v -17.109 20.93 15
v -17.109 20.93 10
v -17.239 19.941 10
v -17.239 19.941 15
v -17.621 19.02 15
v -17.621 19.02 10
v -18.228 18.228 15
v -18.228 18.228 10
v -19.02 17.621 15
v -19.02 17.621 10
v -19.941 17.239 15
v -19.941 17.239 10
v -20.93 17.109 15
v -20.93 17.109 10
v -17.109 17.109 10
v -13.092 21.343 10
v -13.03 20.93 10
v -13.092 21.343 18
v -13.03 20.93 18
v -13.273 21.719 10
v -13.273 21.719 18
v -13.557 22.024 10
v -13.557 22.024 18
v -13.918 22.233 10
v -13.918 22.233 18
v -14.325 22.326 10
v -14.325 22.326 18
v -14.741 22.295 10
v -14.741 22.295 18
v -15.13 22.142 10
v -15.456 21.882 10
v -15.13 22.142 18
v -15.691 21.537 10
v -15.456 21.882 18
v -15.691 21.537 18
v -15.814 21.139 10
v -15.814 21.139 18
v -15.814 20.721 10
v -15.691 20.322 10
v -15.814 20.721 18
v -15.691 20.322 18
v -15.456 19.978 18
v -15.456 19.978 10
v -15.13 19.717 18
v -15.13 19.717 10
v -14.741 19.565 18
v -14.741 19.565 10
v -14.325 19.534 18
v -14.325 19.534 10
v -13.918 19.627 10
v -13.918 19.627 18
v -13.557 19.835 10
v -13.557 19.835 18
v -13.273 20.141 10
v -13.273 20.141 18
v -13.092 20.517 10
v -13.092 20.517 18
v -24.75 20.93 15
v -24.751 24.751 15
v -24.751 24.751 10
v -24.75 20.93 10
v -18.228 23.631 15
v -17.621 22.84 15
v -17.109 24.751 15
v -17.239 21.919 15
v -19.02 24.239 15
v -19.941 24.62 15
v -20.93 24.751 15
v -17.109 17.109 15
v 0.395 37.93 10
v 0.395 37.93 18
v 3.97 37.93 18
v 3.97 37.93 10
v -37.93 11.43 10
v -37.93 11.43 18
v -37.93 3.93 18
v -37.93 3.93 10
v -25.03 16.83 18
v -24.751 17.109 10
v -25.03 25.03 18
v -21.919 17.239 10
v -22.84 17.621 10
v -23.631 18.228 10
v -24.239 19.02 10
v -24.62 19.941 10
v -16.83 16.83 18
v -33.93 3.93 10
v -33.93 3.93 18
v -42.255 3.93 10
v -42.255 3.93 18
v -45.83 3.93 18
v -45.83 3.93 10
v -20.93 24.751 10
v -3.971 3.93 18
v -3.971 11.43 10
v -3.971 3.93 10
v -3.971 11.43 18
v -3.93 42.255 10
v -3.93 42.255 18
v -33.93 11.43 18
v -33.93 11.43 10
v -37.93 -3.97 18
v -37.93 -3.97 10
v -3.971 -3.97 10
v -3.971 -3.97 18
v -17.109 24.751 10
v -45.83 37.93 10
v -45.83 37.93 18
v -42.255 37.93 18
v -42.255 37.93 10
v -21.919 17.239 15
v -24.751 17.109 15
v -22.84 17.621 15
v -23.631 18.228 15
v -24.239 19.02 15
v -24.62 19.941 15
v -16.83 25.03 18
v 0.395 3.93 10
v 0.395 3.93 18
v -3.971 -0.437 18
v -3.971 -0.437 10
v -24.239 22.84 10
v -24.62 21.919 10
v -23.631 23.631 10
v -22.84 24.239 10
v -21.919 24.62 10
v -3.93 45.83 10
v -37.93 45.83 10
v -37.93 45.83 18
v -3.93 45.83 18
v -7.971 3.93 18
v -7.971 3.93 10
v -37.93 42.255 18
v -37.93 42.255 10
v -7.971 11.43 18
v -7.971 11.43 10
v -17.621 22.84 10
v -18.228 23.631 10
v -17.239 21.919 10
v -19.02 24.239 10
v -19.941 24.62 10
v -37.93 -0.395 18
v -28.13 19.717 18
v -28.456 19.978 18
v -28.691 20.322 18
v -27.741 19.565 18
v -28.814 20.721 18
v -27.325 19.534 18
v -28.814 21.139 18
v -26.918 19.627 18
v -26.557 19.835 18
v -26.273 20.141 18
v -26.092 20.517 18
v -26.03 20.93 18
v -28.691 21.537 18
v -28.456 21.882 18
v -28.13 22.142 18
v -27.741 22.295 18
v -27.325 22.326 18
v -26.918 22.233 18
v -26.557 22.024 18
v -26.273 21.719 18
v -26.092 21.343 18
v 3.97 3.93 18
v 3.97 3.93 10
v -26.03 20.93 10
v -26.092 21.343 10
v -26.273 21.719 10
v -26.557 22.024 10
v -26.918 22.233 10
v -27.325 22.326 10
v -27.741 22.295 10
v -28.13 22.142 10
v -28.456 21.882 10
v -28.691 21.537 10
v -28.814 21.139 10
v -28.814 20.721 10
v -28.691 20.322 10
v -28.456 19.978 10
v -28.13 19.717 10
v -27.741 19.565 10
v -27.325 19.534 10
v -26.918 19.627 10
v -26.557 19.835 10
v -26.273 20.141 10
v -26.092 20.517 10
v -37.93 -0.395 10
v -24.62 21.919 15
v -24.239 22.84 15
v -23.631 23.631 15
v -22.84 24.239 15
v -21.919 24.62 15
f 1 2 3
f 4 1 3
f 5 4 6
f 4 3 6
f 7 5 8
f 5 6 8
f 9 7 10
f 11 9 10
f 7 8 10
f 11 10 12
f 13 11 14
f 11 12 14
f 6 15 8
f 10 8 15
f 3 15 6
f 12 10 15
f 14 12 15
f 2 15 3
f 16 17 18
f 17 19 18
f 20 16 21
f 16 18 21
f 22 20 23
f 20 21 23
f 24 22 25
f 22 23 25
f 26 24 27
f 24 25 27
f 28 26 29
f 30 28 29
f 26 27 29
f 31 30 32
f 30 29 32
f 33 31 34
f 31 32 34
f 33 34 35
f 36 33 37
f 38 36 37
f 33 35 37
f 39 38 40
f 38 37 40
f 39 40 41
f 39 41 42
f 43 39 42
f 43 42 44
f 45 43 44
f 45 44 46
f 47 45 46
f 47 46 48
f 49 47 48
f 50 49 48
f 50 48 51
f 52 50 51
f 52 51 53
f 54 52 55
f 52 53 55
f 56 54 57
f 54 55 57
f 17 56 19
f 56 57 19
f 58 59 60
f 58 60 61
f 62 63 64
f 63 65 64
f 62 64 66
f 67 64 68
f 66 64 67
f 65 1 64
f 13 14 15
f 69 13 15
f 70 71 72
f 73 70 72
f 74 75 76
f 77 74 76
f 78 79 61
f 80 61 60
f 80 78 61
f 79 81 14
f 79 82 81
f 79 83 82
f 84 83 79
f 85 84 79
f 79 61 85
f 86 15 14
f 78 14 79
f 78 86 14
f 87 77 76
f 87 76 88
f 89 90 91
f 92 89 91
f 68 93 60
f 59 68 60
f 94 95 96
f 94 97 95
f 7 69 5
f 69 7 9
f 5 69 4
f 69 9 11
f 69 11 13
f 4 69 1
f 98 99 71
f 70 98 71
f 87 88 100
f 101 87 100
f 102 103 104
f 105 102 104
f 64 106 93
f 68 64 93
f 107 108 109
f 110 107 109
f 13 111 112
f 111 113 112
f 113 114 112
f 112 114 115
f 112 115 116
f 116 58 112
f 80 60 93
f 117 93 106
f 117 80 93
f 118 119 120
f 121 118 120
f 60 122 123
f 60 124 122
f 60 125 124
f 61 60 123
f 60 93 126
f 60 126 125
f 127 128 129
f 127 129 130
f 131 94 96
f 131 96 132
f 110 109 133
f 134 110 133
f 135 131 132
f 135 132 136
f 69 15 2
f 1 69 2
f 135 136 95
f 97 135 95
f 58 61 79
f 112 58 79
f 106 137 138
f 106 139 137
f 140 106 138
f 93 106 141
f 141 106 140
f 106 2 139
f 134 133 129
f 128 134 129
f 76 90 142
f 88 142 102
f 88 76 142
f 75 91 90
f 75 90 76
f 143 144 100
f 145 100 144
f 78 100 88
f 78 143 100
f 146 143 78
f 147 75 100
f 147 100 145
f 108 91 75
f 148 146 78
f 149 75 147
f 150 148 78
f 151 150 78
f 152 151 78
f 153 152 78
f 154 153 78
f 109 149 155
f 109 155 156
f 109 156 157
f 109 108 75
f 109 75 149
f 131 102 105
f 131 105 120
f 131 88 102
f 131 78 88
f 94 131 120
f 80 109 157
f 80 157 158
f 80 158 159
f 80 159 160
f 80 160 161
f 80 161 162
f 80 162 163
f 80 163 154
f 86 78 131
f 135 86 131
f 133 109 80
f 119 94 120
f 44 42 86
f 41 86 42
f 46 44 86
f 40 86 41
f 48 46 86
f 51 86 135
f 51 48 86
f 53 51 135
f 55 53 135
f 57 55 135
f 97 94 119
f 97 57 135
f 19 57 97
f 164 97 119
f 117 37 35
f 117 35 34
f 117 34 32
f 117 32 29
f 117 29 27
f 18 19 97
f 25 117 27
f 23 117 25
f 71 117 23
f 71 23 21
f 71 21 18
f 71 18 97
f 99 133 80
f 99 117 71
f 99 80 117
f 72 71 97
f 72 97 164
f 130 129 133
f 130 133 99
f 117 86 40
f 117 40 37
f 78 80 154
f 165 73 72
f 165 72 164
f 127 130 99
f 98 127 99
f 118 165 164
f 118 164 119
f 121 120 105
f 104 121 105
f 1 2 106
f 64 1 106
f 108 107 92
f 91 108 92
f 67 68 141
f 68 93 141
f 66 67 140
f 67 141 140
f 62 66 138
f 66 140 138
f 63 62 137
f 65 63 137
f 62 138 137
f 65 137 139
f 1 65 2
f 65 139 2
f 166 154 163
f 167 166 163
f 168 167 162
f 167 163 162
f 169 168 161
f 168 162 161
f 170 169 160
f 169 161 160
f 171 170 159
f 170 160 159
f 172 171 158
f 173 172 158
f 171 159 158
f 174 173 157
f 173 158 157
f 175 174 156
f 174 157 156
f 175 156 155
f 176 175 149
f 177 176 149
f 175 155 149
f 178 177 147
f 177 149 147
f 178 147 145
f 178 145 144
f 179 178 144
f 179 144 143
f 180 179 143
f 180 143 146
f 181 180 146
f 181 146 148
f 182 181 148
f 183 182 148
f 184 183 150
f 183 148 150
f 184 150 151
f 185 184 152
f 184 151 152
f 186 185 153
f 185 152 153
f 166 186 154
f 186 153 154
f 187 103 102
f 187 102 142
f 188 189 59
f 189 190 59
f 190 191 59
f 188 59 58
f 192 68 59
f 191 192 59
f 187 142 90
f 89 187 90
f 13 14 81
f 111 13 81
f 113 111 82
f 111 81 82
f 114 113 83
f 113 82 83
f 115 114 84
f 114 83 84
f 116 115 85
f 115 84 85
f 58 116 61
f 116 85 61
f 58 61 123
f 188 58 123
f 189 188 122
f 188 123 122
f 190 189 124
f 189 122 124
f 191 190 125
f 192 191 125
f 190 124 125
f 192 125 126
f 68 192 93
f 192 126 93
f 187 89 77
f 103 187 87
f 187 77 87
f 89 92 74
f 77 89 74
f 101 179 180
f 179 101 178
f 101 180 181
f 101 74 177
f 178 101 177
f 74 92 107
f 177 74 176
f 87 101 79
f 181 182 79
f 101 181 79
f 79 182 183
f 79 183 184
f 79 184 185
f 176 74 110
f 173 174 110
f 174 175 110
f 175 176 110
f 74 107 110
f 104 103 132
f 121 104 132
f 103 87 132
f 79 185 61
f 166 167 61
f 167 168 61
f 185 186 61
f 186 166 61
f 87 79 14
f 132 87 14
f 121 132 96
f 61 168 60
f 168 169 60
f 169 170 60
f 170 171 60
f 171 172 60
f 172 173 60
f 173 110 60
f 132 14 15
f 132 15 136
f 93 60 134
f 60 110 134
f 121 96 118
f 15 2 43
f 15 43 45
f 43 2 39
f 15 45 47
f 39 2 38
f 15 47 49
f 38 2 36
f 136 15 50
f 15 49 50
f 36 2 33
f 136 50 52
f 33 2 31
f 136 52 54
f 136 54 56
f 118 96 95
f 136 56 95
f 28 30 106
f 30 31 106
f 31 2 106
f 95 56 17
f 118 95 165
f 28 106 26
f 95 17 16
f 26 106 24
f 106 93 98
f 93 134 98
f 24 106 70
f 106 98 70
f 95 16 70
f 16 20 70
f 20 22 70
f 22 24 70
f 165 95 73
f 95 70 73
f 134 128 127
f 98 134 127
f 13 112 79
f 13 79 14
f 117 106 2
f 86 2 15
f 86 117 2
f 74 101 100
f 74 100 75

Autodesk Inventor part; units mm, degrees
ref_plane "YZ Plane" through (0, 0, 0) normal (1, 0, 0) x (0, 1, 0)
ref_plane "XZ Plane" through (0, 0, 0) normal (0, 1, 0) x (-1, 0, 0)
ref_plane "Work Plane1" through (0, 0, 10) normal (0, 0, 1) x (1, 0, 0)
sketch "Sketch1" plane through (0, 0, 10) normal (0, 0, 1) x (1, 0, 0)
  line L0 (-4.0299, -0.3538) -> (-2.2322, 1.4439) construction
  arc A0 (-1.4439, 2.2322) -> (-2.2322, 1.4439) centre (-0.9299, 0.9299) ccw construction
  line L1 (-1.4439, 2.2322) -> (0.3538, 4.0299) construction
  line L2 (-37.8299, 42.8299) -> (-37.8299, 37.8299) construction
  line L3 (-37.8299, 37.8299) -> (-42.9208, 37.8299) construction
  line L4 (-37.8299, 42.2137) -> (-37.8299, 45.8299) construction
  line L5 (-37.8299, 45.8299) -> (-4.0299, 45.8299) construction
  line L6 (-4.0299, 45.8299) -> (-4.0299, 42.2137) construction
  line L7 (-4.0299, 4.0299) -> (0.3538, 4.0299) projected
  circle A1 centre (-20.9299, 20.9299) radius 17.5 projected
  line L8 (-20.9299, 58.9723) -> (17.1124, 20.9299) construction
  line L9 (17.1124, 20.9299) -> (-20.9299, -17.1124) construction
  line L10 (-20.9299, -17.1124) -> (-58.9723, 20.9299) construction
  line L11 (-58.9723, 20.9299) -> (-20.9299, 58.9723) construction
  line L12 (-20.9299, 58.9723) -> (-20.9299, -17.1124) construction
  line L13 (17.1124, 20.9299) -> (-58.9723, 20.9299) construction
  line L14 (-20.9299, 58.9723) -> (32.8701, 58.9723) construction
  line L15 (-43.4299, 43.4299) -> (1.5701, 43.4299) construction
  line L16 (1.5701, 43.4299) -> (1.5701, -1.5701) construction
  line L17 (1.5701, -1.5701) -> (-43.4299, -1.5701) construction
  line L18 (-43.4299, -1.5701) -> (-43.4299, 43.4299) construction
  line L19 (-43.4299, 43.4299) -> (1.5701, -1.5701) construction
  line L20 (1.5701, 43.4299) -> (-43.4299, -1.5701) construction
  line L21 (-43.4299, 5.3876) -> (-43.4299, 36.4723)
  line L22 (-43.4299, 36.4723) -> (-36.4723, 43.4299)
  line L23 (-36.4723, 43.4299) -> (-5.3876, 43.4299)
  line L24 (-5.3876, 43.4299) -> (1.5701, 36.4723)
  line L25 (1.5701, 36.4723) -> (1.5701, 5.3876)
  line L26 (1.5701, 5.3876) -> (-5.3876, -1.5701)
  line L27 (-5.3876, -1.5701) -> (-36.4723, -1.5701)
  line L28 (-36.4723, -1.5701) -> (-43.4299, 5.3876)
  line L29 (-4.0299, 42.2137) -> (-37.8299, 42.2137) projected
  line L30 (-4.0299, -0.3538) -> (-4.0299, 4.0299) projected
  circle A2 centre (-20.9299, 20.9299) radius 1.5
  line L31 (-10.9299, 10.9299) -> (-30.9299, 10.9299) construction
  line L32 (-30.9299, 10.9299) -> (-30.9299, 30.9299) construction
  line L33 (-30.9299, 30.9299) -> (-10.9299, 30.9299) construction
  line L34 (-10.9299, 30.9299) -> (-10.9299, 10.9299) construction
  line L35 (-10.9299, 10.9299) -> (-30.9299, 30.9299) construction
  line L36 (-30.9299, 10.9299) -> (-10.9299, 30.9299) construction
  circle A3 centre (-30.9299, 30.9299) radius 1.4
  circle A4 centre (-30.9299, 10.9299) radius 1.4
  circle A5 centre (-10.9299, 10.9299) radius 1.4
  line L37 (-45.8299, 37.8299) -> (-42.0723, 37.8299) construction
  line L38 (-42.1723, 37.7299) -> (-45.8299, 37.7299)
  line L39 (-45.8299, 37.7299) -> (-45.8299, 4.1299)
  line L40 (-45.8299, 4.1299) -> (-42.1723, 4.1299)
  line L41 (-42.1723, 4.1299) -> (-42.1723, 37.7299)
  line L42 (-45.8299, 4.0299) -> (-42.0723, 4.0299) construction
  line L43 (-45.8299, 37.8299) -> (-42.0723, 37.8299) projected
  line L44 (-37.7299, 45.8299) -> (-4.1299, 45.8299)
  line L45 (-4.1299, 45.8299) -> (-4.1299, 42.1723)
  line L46 (-4.1299, 42.1723) -> (-37.7299, 42.1723)
  line L47 (-37.7299, 42.1723) -> (-37.7299, 45.8299)
  line L48 (0.4701, 37.8299) -> (0.4701, 4.0299) construction
  line L49 (0.4701, 4.0299) -> (3.9701, 4.0299) construction
  line L50 (3.9701, 37.8299) -> (3.9701, 4.0299) construction
  line L51 (0.4701, 37.8299) -> (3.9701, 37.8299) construction
  line L52 (-45.8299, -3.9701) -> (-4.0299, -3.9701) construction
  line L53 (0.3124, 37.7299) -> (3.9701, 37.7299)
  line L54 (3.9701, 37.7299) -> (3.9701, 4.1299)
  line L55 (3.9701, 4.1299) -> (0.3124, 4.1299)
  line L56 (0.3124, 4.1299) -> (0.3124, 37.7299)
  line L57 (-4.1713, -0.3538) -> (-37.7299, -0.3538)
  line L58 (-37.7299, -0.3538) -> (-37.7299, -3.9701)
  line L59 (-37.7299, -3.9701) -> (-4.1713, -3.9701)
  line L60 (-4.1713, -3.9701) -> (-4.1713, -0.3538)
  point P0 (-37.8299, 4.0299)
  dimension "d18" = 53.8
  dimension "d19" = 45
  dimension "d20" = 53.8
  dimension "d21" = 45
  dimension "d22" = 45
  dimension "d30" = 20
  dimension "d31" = 20
  dimension "d32" = 2.8
  dimension "d33" = 2.8
  dimension "d34" = 2.8
  dimension "d35" = 3
  dimension "d36" = 0.1
  dimension "d37" = 0.1
  dimension "d38" = 0.1
  dimension "d39" = 0.1
extrude "Extrusion1" add sketch "Sketch1" along normal blind 8 contours L30 L26 L57 L28 L41 L22 L46 L24 L56 L7 | L7 L26 L30 | L56 L24 L25 L26 | L26 L25 L24 L53 L54 L55 | L60 L59 L58 L57 L28 L27 L26 | L26 L27 L28 L57 | L46 L22 L29 L24 | L24 L29 L45 | L40 L39 L38 L22 L21 L28 | L28 L21 L22 L41 | L29 L22 L23 L24 | L24 L23 L22 L29 L47 L44 L45 | L47 L29 L22 | A1 | A2 | A3 | A4 | A5
sketch "Skizze4" plane through (0, 0, 18) normal (0, 0, 1) x (1, 0, 0)
  line L0 (-37.7299, 42.1723) -> (-42.1723, 37.7299) projected
  line L1 (-42.1723, 37.7299) -> (-45.8299, 37.7299) projected
  line L2 (-45.8299, 37.7299) -> (-45.8299, 4.1299) construction
  line L3 (-45.8299, 4.1299) -> (-42.1723, 4.1299) projected
  line L4 (-42.1723, 4.1299) -> (-37.6885, -0.3538) projected
  line L5 (-37.6885, -0.3538) -> (-37.7299, -0.3538) projected
  line L6 (-37.7299, -0.3538) -> (-37.7299, -3.9701) projected
  line L7 (-37.7299, -3.9701) -> (-4.1713, -3.9701) construction
  line L8 (-4.1713, -3.9701) -> (-4.1713, -0.3538) projected
  line L9 (-4.1713, -0.3538) -> (0.3124, 4.1299) projected
  line L10 (0.3124, 4.1299) -> (3.9701, 4.1299) projected
  line L11 (3.9701, 4.1299) -> (3.9701, 37.7299) construction
  line L12 (3.9701, 37.7299) -> (0.3124, 37.7299) projected
  line L13 (0.3124, 37.7299) -> (-4.1299, 42.1723) projected
  line L14 (-4.1299, 42.1723) -> (-4.1299, 45.8299) projected
  line L15 (-4.1299, 45.8299) -> (-37.7299, 45.8299) construction
  line L16 (-37.7299, 45.8299) -> (-37.7299, 42.1723) projected
  line L17 (-37.9299, 46.0299) -> (-3.9299, 46.0299) construction
  line L18 (-3.9299, 46.0299) -> (-3.9299, 42.2551)
  line L19 (-3.9299, 42.2551) -> (0.3953, 37.9299)
  line L20 (0.3953, 37.9299) -> (4.1701, 37.9299)
  line L21 (4.1701, 37.9299) -> (4.1701, 3.9299) construction
  line L22 (4.1701, 3.9299) -> (0.3953, 3.9299)
  line L23 (0.3953, 3.9299) -> (-3.9713, -0.4367)
  line L24 (-3.9713, -0.4367) -> (-3.9713, -4.1701)
  line L25 (-3.9713, -4.1701) -> (-37.9299, -4.1701) construction
  line L26 (-37.9299, -4.1701) -> (-37.9299, -0.3953)
  line L27 (-37.9299, -0.3953) -> (-42.2551, 3.9299)
  line L28 (-42.2551, 3.9299) -> (-46.0299, 3.9299)
  line L29 (-46.0299, 3.9299) -> (-46.0299, 37.9299) construction
  line L30 (-46.0299, 37.9299) -> (-42.2551, 37.9299)
  line L31 (-42.2551, 37.9299) -> (-37.9299, 42.2551)
  line L32 (-37.9299, 42.2551) -> (-37.9299, 46.0299)
  line L33 (-45.8299, 37.7299) -> (-45.8299, 37.9299)
  line L34 (-4.1299, 45.8299) -> (-37.7299, 45.8299) projected
  line L35 (-37.7299, 45.8299) -> (-37.9299, 45.8299)
  line L36 (-4.1299, 45.8299) -> (-3.9299, 45.8299)
  line L37 (3.9701, 37.7299) -> (3.9701, 37.9299)
  line L38 (3.9701, 4.1299) -> (3.9701, 37.7299) projected
  line L39 (3.9701, 4.1299) -> (3.9701, 3.9299)
  line L40 (-4.1713, -3.9701) -> (-3.9713, -3.9701)
  line L41 (-37.7299, -3.9701) -> (-37.9299, -3.9701)
  line L42 (-45.8299, 4.1299) -> (-45.8299, 3.9299)
  point P0 (0, 0)
  dimension "d40" = 0.2
extrude "IM_offset" add sketch "Skizze4" against normal up to surface (8 mm away)
sketch "Sketch24" plane through (0, 0, 18) normal (0, 0, 1) x (1, 0, 0)
  line L0 (-3.9299, 45.8299) -> (-37.9299, 45.8299) projected
  line L1 (-37.9299, 45.8299) -> (-37.9299, 42.2551) projected
  line L2 (-37.9299, 42.2551) -> (-42.2551, 37.9299) projected
  line L3 (-42.2551, 37.9299) -> (-45.8299, 37.9299) projected
  line L4 (-45.8299, 37.9299) -> (-45.8299, 3.9299) projected
  line L5 (-42.2551, 3.9299) -> (-45.8299, 3.9299) projected
  line L6 (-37.9299, -0.3953) -> (-42.2551, 3.9299) projected
  line L7 (-37.9299, -3.9701) -> (-37.9299, -0.3953) projected
  line L8 (-3.9713, -3.9701) -> (-37.9299, -3.9701) projected
  line L9 (-3.9713, -3.9701) -> (-3.9713, -0.4367) projected
  line L10 (-3.9713, -0.4367) -> (0.3953, 3.9299) projected
  line L11 (0.3953, 3.9299) -> (3.9701, 3.9299) projected
  line L12 (3.9701, 3.9299) -> (3.9701, 37.9299) projected
  line L13 (3.9701, 37.9299) -> (0.3953, 37.9299) projected
  line L14 (0.3953, 37.9299) -> (-3.9299, 42.2551) projected
  line L15 (-3.9299, 42.2551) -> (-3.9299, 45.8299) projected
  line L16 (-25.0299, 25.0299) -> (-16.8299, 25.0299)
  line L17 (-16.8299, 25.0299) -> (-16.8299, 16.8299)
  line L18 (-16.8299, 16.8299) -> (-25.0299, 16.8299)
  line L19 (-25.0299, 16.8299) -> (-25.0299, 25.0299)
  line L20 (-25.0299, 25.0299) -> (-16.8299, 16.8299) construction
  line L21 (-16.8299, 25.0299) -> (-25.0299, 16.8299) construction
  circle A0 centre (-20.9299, 20.9299) radius 24.9 construction
  point P0 (0, 0)
  point P1 (-20.9299, 20.9299)
  point P2 (-20.9299, 20.9299)
  dimension "d143" = 8.2
  dimension "d144" = 8.2
extrude "Extrusion20" cut sketch "Sketch24" against normal blind 10 draft -2 contours L16 L17 L18 L19
sketch "Skizze25" plane through (0, 0, 10) normal (0, 0, -1) x (-1, 0, 0)
  line L0 (24.7506, 24.7506) -> (24.7506, 17.1093) projected
  line L1 (24.7506, 17.1093) -> (17.1093, 17.1093) projected
  line L2 (17.1093, 17.1093) -> (17.1093, 24.7506) projected
  line L3 (17.1093, 24.7506) -> (24.7506, 24.7506) projected
  line L4 (3.9713, -3.9701) -> (37.9299, -3.9701) projected
  line L5 (37.9299, -3.9701) -> (37.9299, -0.3953) projected
  line L6 (37.9299, -0.3953) -> (42.2551, 3.9299) projected
  line L7 (42.2551, 3.9299) -> (45.8299, 3.9299) projected
  line L8 (45.8299, 3.9299) -> (45.8299, 37.9299) projected
  line L9 (45.8299, 37.9299) -> (42.2551, 37.9299) projected
  line L10 (42.2551, 37.9299) -> (37.9299, 42.2551) projected
  line L11 (37.9299, 42.2551) -> (37.9299, 45.8299) projected
  line L12 (37.9299, 45.8299) -> (3.9299, 45.8299) projected
  line L13 (3.9299, 45.8299) -> (3.9299, 42.2551) projected
  line L14 (3.9299, 42.2551) -> (-0.3953, 37.9299) projected
  line L15 (-0.3953, 37.9299) -> (-3.9701, 37.9299) projected
  line L16 (-3.9701, 37.9299) -> (-3.9701, 3.9299) projected
  line L17 (-3.9701, 3.9299) -> (-0.3953, 3.9299) projected
  line L18 (-0.3953, 3.9299) -> (3.9713, -0.4367) projected
  line L19 (3.9713, -0.4367) -> (3.9713, -3.9701) projected
  circle A0 centre (20.9299, 20.9299) radius 3.8206
  line L20 (24.7506, 24.7506) -> (17.1093, 24.7506)
  line L21 (17.1093, 24.7506) -> (17.1093, 17.1093)
  line L22 (17.1093, 17.1093) -> (24.7506, 17.1093)
  line L23 (24.7506, 17.1093) -> (24.7506, 24.7506)
  point P0 (0, 0)
  point P1 (17.1093, 20.9299)
  point P2 (20.9299, 24.7506)
  point P3 (24.7506, 20.9299)
  point P4 (20.9299, 17.1093)
extrude "Extrusion21" add sketch "Skizze25" against normal blind 5 contours L0 A0 L3 | L0 L1 A0 | A0 L2 L3 | L1 L2 A0
sketch "Skizze26" plane through (0, 0, 18) normal (0, 0, 1) x (1, 0, 0)
  line L0 (-25.0299, 16.8299) -> (-25.0299, 25.0299) projected
  line L1 (-25.0299, 25.0299) -> (-16.8299, 25.0299) projected
  line L2 (-16.8299, 25.0299) -> (-16.8299, 16.8299) projected
  line L3 (-16.8299, 16.8299) -> (-25.0299, 16.8299) projected
  line L4 (-3.9299, 45.8299) -> (-37.9299, 45.8299) projected
  line L5 (-37.9299, 45.8299) -> (-37.9299, 42.2551) projected
  line L6 (-37.9299, 42.2551) -> (-42.2551, 37.9299) projected
  line L7 (-42.2551, 37.9299) -> (-45.8299, 37.9299) projected
  line L8 (-45.8299, 37.9299) -> (-45.8299, 3.9299) projected
  line L9 (-42.2551, 3.9299) -> (-45.8299, 3.9299) projected
  line L10 (-37.9299, -0.3953) -> (-42.2551, 3.9299) projected
  line L11 (-37.9299, -3.9701) -> (-37.9299, -0.3953) projected
  line L12 (-3.9713, -3.9701) -> (-37.9299, -3.9701) projected
  line L13 (-3.9713, -3.9701) -> (-3.9713, -0.4367) projected
  line L14 (-3.9713, -0.4367) -> (0.3953, 3.9299) projected
  line L15 (0.3953, 3.9299) -> (3.9701, 3.9299) projected
  line L16 (3.9701, 3.9299) -> (3.9701, 37.9299) projected
  line L17 (3.9701, 37.9299) -> (0.3953, 37.9299) projected
  line L18 (0.3953, 37.9299) -> (-3.9299, 42.2551) projected
  line L19 (-3.9299, 42.2551) -> (-3.9299, 45.8299) projected
  arc A0 (-20.9299, 24.7506) -> (-24.7506, 20.9299) centre (-20.9299, 20.9299) ccw projected
  circle A1 centre (-20.9299, 20.9299) radius 6.5
  circle A2 centre (-27.4299, 20.9299) radius 1.4
  circle A3 centre (-14.4299, 20.9299) radius 1.4
  point P0 (0, 0)
  dimension "d152" = 13
  dimension "d153" = 2.8
  dimension "d154" = 2.8
extrude "Extrusion22" cut sketch "Skizze26" against normal through all contours A1 A3 | A1 A3 | A2 A1 | A1 A2
ref_plane "Arbeitsebene5" through (-37.9299, 20.9299, 10) normal (0, -1, 0) x (1, 0, 0)
ref_plane "Arbeitsebene6" through (-20.9299, 3.9299, 10) normal (-1, 0, 0) x (0, 0, 1)
sketch "Skizze27" plane through (0, 0, 18) normal (0, 0, 1) x (1, 0, 0)
  circle A0 centre (-14.4299, 20.9299) radius 1.4 projected
  circle A1 centre (-27.4299, 20.9299) radius 1.4 projected
  line L0 (-25.0299, 16.8299) -> (-25.0299, 25.0299) projected
  line L1 (-25.0299, 25.0299) -> (-16.8299, 25.0299) projected
  line L2 (-16.8299, 25.0299) -> (-16.8299, 16.8299) projected
  line L3 (-16.8299, 16.8299) -> (-25.0299, 16.8299) projected
  line L4 (-3.9299, 45.8299) -> (-37.9299, 45.8299) projected
  line L5 (-37.9299, 45.8299) -> (-37.9299, 42.2551) projected
  line L6 (-37.9299, 42.2551) -> (-42.2551, 37.9299) projected
  line L7 (-42.2551, 37.9299) -> (-45.8299, 37.9299) projected
  line L8 (-45.8299, 37.9299) -> (-45.8299, 3.9299) projected
  line L9 (-42.2551, 3.9299) -> (-45.8299, 3.9299) projected
  line L10 (-37.9299, -0.3953) -> (-42.2551, 3.9299) projected
  line L11 (-37.9299, -3.9701) -> (-37.9299, -0.3953) projected
  line L12 (-3.9713, -3.9701) -> (-37.9299, -3.9701) projected
  line L13 (-3.9713, -3.9701) -> (-3.9713, -0.4367) projected
  line L14 (-3.9713, -0.4367) -> (0.3953, 3.9299) projected
  line L15 (0.3953, 3.9299) -> (3.9701, 3.9299) projected
  line L16 (3.9701, 3.9299) -> (3.9701, 37.9299) projected
  line L17 (3.9701, 37.9299) -> (0.3953, 37.9299) projected
  line L18 (0.3953, 37.9299) -> (-3.9299, 42.2551) projected
  line L19 (-3.9299, 42.2551) -> (-3.9299, 45.8299) projected
  line L20 (-37.9299, 3.9299) -> (-33.9299, 3.9299)
  line L21 (-33.9299, 3.9299) -> (-33.9299, 11.4299)
  line L22 (-33.9299, 11.4299) -> (-37.9299, 11.4299)
  line L23 (-37.9299, 11.4299) -> (-37.9299, 3.9299)
  line L24 (-3.9713, 3.9299) -> (-7.9713, 3.9299)
  line L25 (-7.9713, 3.9299) -> (-7.9713, 11.4299)
  line L26 (-7.9713, 11.4299) -> (-3.9713, 11.4299)
  line L27 (-3.9713, 11.4299) -> (-3.9713, 3.9299)
  point P0 (0, 0)
  dimension "d157" = 4
  dimension "d158" = 7.5
  dimension "d159" = 4
extrude "Extrusion23" cut sketch "Skizze27" against normal blind 10 contours L23 L22 L21 L20 | L24 L25 L26 L27
properties part number "20_Cube_Insert_Filter_25mm"
